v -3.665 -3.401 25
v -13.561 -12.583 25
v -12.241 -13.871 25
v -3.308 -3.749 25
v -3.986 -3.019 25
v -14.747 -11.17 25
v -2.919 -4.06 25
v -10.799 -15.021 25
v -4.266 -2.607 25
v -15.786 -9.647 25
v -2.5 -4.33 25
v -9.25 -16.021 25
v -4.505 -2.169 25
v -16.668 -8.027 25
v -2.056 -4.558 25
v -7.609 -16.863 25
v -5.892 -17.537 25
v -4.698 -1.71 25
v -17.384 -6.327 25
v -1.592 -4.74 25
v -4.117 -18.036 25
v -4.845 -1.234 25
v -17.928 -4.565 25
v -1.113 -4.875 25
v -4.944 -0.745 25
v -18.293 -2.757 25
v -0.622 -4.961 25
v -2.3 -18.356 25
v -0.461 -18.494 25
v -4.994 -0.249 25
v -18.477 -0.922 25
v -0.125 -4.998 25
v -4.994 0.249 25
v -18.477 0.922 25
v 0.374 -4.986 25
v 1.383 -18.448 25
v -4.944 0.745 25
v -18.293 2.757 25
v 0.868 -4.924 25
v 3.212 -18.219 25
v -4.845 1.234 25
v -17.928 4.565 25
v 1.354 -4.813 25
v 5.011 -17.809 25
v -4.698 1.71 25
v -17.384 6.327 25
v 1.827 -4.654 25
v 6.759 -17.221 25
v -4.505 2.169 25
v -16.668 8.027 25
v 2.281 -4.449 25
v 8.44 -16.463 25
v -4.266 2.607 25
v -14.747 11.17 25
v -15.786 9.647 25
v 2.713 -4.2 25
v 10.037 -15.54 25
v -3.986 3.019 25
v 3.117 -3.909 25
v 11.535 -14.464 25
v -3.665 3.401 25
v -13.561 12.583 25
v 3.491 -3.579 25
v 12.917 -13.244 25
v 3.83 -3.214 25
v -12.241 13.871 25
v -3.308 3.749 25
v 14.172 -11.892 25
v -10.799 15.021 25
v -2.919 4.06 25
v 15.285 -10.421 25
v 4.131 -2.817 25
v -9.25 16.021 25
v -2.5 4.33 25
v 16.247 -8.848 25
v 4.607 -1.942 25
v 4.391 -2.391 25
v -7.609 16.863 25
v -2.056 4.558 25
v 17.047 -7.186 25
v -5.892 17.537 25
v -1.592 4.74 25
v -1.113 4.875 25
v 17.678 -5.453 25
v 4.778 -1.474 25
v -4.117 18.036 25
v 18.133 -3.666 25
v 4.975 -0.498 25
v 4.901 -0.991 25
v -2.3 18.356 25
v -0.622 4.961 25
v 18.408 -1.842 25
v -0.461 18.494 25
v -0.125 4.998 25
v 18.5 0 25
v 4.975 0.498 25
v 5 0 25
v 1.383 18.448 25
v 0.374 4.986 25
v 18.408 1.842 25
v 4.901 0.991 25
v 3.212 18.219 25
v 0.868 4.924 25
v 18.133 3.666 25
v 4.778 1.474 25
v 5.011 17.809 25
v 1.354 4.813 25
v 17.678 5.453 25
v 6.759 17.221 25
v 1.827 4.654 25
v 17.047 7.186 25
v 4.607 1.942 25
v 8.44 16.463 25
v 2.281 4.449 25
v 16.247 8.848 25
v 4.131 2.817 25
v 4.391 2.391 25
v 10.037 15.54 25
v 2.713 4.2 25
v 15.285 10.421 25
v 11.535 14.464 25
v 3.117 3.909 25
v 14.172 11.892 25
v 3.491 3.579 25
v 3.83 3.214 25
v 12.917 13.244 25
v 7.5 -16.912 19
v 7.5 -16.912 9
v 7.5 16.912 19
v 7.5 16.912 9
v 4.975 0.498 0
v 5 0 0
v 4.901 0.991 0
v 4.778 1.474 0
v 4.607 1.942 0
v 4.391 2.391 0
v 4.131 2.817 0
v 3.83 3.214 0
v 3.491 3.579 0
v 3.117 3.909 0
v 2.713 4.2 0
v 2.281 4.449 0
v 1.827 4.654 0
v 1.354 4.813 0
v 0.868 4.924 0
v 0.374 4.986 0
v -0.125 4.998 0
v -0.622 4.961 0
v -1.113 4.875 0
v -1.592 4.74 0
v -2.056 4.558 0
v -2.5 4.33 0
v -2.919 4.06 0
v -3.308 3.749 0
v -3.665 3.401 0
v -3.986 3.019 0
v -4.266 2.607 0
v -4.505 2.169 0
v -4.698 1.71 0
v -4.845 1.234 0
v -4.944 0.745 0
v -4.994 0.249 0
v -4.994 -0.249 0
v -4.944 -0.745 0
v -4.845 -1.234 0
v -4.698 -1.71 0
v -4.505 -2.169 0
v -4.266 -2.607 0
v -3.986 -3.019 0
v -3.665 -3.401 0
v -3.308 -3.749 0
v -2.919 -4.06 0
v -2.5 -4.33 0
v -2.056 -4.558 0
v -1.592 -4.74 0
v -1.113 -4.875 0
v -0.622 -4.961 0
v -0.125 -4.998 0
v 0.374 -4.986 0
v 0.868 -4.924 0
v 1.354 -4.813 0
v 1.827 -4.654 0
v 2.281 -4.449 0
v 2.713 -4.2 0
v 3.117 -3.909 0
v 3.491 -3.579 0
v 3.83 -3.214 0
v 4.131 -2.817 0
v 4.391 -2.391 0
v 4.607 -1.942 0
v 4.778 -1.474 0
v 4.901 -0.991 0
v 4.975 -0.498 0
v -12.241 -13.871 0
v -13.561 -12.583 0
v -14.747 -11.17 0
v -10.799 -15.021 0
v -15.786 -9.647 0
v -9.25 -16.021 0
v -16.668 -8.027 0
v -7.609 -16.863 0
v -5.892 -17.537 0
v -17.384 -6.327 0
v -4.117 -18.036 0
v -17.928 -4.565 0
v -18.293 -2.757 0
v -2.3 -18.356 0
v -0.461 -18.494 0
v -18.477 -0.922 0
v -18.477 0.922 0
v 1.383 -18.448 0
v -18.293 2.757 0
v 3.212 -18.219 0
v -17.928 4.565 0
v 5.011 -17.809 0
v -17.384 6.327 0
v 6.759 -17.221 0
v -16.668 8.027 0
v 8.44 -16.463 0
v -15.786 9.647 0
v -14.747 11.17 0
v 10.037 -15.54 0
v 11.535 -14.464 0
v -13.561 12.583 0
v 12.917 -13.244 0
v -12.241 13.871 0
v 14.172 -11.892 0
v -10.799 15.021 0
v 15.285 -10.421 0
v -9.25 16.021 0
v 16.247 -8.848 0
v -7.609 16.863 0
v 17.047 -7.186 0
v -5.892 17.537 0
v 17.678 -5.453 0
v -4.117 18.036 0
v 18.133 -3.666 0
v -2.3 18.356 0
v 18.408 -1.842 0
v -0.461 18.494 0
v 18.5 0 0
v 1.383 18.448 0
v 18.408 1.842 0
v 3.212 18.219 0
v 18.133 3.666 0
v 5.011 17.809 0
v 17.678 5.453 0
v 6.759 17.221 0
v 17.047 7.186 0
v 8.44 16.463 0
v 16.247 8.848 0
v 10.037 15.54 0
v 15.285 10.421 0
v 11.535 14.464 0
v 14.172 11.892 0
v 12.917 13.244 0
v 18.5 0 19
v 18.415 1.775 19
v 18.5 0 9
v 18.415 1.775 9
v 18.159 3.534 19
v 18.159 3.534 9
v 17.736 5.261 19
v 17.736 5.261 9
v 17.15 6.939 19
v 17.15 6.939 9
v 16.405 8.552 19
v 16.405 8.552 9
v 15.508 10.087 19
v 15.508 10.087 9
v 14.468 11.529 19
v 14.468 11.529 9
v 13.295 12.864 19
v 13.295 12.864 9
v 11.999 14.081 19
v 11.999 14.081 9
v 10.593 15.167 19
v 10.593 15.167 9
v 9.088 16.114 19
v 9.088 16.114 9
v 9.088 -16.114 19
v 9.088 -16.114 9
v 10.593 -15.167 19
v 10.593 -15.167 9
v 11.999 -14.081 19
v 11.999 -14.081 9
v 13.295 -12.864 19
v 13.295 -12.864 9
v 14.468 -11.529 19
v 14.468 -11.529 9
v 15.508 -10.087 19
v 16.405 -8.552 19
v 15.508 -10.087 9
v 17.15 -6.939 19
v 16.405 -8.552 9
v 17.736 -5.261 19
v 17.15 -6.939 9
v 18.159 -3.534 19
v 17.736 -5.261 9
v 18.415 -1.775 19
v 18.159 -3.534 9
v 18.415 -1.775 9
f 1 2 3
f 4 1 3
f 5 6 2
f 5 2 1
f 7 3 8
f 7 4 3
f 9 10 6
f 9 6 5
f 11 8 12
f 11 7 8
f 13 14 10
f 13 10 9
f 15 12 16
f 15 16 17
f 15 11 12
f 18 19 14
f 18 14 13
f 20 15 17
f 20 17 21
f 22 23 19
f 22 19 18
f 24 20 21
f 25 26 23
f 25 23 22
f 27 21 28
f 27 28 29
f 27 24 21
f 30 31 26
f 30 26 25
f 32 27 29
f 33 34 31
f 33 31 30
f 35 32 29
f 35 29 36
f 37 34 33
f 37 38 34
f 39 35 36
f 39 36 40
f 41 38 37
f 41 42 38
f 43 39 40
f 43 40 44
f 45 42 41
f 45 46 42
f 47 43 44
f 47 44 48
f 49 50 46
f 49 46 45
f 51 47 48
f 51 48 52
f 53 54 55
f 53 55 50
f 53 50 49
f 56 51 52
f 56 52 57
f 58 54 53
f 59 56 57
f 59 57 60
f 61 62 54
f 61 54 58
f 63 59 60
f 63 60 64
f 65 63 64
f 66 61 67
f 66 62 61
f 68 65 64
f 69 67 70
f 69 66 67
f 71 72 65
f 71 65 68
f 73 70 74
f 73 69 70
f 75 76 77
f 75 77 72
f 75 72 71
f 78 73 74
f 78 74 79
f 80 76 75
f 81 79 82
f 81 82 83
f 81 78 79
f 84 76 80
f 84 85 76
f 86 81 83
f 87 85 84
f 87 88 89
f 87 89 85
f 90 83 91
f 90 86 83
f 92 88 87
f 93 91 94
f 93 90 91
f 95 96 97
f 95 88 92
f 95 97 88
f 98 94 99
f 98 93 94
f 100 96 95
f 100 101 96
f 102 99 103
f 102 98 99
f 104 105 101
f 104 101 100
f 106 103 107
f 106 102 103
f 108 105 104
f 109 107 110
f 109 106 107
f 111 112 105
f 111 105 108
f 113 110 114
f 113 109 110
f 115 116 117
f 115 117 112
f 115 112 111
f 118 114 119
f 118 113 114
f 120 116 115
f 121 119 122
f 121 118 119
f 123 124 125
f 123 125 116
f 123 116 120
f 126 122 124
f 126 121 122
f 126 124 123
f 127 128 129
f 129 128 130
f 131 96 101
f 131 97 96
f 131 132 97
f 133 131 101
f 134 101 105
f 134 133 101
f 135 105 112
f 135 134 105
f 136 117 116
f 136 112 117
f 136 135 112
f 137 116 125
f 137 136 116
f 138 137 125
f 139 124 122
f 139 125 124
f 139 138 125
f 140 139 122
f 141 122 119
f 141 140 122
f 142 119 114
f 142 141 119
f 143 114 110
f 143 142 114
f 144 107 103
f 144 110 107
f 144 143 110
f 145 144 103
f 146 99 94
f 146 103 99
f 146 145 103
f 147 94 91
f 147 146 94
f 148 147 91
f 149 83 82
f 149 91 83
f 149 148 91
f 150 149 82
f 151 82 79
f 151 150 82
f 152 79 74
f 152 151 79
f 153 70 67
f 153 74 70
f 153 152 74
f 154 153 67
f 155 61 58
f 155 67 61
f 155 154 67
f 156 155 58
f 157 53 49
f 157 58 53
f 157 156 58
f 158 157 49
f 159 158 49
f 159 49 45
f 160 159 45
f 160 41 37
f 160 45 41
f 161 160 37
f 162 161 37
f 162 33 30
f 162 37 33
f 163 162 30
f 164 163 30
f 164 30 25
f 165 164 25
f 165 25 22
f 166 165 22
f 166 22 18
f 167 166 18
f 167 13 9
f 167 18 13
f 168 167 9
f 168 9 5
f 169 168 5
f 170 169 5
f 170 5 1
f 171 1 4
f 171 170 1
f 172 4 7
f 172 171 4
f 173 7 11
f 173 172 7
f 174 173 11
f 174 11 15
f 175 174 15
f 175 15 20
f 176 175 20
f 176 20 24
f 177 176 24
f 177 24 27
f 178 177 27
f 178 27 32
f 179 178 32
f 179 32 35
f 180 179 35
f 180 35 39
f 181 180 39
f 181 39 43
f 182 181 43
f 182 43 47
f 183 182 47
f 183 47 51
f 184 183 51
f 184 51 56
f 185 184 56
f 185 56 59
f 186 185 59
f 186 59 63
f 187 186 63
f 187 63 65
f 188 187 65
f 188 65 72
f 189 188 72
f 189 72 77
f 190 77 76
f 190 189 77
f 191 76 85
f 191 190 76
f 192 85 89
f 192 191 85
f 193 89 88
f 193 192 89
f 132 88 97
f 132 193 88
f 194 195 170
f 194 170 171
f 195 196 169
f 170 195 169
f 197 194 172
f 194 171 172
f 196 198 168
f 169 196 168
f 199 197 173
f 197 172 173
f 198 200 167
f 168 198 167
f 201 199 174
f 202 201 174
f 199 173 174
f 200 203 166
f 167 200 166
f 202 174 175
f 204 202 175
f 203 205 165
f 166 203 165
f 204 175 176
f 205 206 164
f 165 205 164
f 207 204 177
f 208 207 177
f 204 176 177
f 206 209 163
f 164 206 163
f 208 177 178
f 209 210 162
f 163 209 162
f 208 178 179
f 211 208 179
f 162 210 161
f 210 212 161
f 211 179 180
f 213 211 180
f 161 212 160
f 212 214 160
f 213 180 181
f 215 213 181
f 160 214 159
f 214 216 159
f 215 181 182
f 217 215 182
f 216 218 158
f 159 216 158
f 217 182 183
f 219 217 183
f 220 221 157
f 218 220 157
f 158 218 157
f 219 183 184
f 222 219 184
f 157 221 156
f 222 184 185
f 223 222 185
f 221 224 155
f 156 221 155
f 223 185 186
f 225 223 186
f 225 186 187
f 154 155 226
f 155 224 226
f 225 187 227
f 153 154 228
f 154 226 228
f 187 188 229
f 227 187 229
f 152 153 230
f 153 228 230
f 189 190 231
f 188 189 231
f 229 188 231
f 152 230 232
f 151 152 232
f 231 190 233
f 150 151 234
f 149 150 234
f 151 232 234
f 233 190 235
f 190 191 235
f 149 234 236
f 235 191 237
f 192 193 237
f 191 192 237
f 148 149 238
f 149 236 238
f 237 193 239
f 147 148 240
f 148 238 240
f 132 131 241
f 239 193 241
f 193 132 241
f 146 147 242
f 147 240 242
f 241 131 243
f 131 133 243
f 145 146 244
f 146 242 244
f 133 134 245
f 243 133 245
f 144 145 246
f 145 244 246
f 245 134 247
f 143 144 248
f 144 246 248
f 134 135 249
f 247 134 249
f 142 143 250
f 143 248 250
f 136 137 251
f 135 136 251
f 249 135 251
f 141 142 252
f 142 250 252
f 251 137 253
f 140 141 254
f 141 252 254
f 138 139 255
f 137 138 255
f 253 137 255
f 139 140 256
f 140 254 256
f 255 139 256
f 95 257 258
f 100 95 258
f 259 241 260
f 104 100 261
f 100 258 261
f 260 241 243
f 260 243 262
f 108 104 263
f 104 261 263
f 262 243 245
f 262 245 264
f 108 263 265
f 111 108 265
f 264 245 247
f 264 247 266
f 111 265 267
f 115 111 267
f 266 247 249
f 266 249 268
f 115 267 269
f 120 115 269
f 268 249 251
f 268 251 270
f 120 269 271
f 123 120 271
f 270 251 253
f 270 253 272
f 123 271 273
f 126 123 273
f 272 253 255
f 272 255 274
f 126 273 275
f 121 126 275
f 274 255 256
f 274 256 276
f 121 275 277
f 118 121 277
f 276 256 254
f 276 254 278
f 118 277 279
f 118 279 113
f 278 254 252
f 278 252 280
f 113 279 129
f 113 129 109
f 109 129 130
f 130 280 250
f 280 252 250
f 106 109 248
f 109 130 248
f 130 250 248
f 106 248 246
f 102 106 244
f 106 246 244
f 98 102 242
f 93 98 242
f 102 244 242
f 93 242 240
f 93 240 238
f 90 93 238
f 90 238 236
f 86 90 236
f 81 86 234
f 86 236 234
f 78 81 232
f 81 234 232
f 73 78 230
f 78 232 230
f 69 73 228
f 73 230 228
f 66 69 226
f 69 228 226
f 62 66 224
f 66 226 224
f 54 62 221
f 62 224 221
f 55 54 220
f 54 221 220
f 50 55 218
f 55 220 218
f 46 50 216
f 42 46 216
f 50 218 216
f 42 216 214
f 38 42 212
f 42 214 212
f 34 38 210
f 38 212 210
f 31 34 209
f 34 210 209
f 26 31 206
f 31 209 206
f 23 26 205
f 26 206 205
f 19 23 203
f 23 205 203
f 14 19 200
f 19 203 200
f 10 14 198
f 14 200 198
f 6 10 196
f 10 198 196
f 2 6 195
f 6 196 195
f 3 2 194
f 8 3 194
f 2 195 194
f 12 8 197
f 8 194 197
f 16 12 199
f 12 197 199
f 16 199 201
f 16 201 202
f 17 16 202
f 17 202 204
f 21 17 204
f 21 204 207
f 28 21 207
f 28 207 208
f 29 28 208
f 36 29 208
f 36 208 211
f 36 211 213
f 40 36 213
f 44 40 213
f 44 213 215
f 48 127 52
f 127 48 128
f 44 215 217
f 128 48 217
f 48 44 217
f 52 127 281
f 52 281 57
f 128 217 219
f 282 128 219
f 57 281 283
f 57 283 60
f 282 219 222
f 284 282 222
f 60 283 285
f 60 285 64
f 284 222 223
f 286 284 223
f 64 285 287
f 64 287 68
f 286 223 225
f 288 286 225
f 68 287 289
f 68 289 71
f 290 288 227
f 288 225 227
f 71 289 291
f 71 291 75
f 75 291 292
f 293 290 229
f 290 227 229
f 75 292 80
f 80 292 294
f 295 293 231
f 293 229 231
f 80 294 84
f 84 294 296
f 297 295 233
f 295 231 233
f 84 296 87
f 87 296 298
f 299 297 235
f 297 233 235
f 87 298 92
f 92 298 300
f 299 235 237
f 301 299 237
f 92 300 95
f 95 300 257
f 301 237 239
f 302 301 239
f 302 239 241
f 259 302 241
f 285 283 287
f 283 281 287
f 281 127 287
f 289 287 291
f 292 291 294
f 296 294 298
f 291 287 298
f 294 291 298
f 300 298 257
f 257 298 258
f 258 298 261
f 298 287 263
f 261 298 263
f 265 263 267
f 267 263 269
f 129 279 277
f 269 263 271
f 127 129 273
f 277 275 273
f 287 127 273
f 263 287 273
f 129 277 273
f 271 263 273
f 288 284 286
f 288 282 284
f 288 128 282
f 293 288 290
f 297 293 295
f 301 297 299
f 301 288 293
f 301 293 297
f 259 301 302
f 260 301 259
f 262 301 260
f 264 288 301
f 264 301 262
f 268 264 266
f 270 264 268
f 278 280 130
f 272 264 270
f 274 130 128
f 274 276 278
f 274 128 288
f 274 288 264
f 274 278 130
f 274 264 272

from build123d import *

# Parameters (mm, degrees)
BOX001_W          = 30
BOX001_H          = 70
BOX001_DEPTH      = 10
CYLINDER003_R     = 5
CYLINDER003_DEPTH = 40
CYLINDER002_R     = 18.5
CYLINDER002_DEPTH = 25


with BuildPart() as cube001:
    # Box001 → Box001 (new body)
    with BuildSketch(Plane(origin=(7.5, -20, 9), x_dir=(1, 0, 0), z_dir=(0, 0, 1))):
        with Locations((15, 35)):
            Rectangle(BOX001_W, BOX001_H)
    extrude(amount=BOX001_DEPTH)


with BuildPart() as cylinder003:
    # Cylinder003 → Cylinder003 (new body)
    with BuildSketch(Plane.XY.offset(-10)):
        Circle(CYLINDER003_R)
    extrude(amount=CYLINDER003_DEPTH)


with BuildPart() as mount:
    # Cylinder002 → Cylinder002 (new body)
    with BuildSketch(Plane.XY):
        Circle(CYLINDER002_R)
    extrude(amount=CYLINDER002_DEPTH)

    # Cut002: cut Cylinder003
    add(cylinder003.part, mode=Mode.SUBTRACT)

    # Cut003: cut Cube001
    add(cube001.part, mode=Mode.SUBTRACT)


solid = mount.part
